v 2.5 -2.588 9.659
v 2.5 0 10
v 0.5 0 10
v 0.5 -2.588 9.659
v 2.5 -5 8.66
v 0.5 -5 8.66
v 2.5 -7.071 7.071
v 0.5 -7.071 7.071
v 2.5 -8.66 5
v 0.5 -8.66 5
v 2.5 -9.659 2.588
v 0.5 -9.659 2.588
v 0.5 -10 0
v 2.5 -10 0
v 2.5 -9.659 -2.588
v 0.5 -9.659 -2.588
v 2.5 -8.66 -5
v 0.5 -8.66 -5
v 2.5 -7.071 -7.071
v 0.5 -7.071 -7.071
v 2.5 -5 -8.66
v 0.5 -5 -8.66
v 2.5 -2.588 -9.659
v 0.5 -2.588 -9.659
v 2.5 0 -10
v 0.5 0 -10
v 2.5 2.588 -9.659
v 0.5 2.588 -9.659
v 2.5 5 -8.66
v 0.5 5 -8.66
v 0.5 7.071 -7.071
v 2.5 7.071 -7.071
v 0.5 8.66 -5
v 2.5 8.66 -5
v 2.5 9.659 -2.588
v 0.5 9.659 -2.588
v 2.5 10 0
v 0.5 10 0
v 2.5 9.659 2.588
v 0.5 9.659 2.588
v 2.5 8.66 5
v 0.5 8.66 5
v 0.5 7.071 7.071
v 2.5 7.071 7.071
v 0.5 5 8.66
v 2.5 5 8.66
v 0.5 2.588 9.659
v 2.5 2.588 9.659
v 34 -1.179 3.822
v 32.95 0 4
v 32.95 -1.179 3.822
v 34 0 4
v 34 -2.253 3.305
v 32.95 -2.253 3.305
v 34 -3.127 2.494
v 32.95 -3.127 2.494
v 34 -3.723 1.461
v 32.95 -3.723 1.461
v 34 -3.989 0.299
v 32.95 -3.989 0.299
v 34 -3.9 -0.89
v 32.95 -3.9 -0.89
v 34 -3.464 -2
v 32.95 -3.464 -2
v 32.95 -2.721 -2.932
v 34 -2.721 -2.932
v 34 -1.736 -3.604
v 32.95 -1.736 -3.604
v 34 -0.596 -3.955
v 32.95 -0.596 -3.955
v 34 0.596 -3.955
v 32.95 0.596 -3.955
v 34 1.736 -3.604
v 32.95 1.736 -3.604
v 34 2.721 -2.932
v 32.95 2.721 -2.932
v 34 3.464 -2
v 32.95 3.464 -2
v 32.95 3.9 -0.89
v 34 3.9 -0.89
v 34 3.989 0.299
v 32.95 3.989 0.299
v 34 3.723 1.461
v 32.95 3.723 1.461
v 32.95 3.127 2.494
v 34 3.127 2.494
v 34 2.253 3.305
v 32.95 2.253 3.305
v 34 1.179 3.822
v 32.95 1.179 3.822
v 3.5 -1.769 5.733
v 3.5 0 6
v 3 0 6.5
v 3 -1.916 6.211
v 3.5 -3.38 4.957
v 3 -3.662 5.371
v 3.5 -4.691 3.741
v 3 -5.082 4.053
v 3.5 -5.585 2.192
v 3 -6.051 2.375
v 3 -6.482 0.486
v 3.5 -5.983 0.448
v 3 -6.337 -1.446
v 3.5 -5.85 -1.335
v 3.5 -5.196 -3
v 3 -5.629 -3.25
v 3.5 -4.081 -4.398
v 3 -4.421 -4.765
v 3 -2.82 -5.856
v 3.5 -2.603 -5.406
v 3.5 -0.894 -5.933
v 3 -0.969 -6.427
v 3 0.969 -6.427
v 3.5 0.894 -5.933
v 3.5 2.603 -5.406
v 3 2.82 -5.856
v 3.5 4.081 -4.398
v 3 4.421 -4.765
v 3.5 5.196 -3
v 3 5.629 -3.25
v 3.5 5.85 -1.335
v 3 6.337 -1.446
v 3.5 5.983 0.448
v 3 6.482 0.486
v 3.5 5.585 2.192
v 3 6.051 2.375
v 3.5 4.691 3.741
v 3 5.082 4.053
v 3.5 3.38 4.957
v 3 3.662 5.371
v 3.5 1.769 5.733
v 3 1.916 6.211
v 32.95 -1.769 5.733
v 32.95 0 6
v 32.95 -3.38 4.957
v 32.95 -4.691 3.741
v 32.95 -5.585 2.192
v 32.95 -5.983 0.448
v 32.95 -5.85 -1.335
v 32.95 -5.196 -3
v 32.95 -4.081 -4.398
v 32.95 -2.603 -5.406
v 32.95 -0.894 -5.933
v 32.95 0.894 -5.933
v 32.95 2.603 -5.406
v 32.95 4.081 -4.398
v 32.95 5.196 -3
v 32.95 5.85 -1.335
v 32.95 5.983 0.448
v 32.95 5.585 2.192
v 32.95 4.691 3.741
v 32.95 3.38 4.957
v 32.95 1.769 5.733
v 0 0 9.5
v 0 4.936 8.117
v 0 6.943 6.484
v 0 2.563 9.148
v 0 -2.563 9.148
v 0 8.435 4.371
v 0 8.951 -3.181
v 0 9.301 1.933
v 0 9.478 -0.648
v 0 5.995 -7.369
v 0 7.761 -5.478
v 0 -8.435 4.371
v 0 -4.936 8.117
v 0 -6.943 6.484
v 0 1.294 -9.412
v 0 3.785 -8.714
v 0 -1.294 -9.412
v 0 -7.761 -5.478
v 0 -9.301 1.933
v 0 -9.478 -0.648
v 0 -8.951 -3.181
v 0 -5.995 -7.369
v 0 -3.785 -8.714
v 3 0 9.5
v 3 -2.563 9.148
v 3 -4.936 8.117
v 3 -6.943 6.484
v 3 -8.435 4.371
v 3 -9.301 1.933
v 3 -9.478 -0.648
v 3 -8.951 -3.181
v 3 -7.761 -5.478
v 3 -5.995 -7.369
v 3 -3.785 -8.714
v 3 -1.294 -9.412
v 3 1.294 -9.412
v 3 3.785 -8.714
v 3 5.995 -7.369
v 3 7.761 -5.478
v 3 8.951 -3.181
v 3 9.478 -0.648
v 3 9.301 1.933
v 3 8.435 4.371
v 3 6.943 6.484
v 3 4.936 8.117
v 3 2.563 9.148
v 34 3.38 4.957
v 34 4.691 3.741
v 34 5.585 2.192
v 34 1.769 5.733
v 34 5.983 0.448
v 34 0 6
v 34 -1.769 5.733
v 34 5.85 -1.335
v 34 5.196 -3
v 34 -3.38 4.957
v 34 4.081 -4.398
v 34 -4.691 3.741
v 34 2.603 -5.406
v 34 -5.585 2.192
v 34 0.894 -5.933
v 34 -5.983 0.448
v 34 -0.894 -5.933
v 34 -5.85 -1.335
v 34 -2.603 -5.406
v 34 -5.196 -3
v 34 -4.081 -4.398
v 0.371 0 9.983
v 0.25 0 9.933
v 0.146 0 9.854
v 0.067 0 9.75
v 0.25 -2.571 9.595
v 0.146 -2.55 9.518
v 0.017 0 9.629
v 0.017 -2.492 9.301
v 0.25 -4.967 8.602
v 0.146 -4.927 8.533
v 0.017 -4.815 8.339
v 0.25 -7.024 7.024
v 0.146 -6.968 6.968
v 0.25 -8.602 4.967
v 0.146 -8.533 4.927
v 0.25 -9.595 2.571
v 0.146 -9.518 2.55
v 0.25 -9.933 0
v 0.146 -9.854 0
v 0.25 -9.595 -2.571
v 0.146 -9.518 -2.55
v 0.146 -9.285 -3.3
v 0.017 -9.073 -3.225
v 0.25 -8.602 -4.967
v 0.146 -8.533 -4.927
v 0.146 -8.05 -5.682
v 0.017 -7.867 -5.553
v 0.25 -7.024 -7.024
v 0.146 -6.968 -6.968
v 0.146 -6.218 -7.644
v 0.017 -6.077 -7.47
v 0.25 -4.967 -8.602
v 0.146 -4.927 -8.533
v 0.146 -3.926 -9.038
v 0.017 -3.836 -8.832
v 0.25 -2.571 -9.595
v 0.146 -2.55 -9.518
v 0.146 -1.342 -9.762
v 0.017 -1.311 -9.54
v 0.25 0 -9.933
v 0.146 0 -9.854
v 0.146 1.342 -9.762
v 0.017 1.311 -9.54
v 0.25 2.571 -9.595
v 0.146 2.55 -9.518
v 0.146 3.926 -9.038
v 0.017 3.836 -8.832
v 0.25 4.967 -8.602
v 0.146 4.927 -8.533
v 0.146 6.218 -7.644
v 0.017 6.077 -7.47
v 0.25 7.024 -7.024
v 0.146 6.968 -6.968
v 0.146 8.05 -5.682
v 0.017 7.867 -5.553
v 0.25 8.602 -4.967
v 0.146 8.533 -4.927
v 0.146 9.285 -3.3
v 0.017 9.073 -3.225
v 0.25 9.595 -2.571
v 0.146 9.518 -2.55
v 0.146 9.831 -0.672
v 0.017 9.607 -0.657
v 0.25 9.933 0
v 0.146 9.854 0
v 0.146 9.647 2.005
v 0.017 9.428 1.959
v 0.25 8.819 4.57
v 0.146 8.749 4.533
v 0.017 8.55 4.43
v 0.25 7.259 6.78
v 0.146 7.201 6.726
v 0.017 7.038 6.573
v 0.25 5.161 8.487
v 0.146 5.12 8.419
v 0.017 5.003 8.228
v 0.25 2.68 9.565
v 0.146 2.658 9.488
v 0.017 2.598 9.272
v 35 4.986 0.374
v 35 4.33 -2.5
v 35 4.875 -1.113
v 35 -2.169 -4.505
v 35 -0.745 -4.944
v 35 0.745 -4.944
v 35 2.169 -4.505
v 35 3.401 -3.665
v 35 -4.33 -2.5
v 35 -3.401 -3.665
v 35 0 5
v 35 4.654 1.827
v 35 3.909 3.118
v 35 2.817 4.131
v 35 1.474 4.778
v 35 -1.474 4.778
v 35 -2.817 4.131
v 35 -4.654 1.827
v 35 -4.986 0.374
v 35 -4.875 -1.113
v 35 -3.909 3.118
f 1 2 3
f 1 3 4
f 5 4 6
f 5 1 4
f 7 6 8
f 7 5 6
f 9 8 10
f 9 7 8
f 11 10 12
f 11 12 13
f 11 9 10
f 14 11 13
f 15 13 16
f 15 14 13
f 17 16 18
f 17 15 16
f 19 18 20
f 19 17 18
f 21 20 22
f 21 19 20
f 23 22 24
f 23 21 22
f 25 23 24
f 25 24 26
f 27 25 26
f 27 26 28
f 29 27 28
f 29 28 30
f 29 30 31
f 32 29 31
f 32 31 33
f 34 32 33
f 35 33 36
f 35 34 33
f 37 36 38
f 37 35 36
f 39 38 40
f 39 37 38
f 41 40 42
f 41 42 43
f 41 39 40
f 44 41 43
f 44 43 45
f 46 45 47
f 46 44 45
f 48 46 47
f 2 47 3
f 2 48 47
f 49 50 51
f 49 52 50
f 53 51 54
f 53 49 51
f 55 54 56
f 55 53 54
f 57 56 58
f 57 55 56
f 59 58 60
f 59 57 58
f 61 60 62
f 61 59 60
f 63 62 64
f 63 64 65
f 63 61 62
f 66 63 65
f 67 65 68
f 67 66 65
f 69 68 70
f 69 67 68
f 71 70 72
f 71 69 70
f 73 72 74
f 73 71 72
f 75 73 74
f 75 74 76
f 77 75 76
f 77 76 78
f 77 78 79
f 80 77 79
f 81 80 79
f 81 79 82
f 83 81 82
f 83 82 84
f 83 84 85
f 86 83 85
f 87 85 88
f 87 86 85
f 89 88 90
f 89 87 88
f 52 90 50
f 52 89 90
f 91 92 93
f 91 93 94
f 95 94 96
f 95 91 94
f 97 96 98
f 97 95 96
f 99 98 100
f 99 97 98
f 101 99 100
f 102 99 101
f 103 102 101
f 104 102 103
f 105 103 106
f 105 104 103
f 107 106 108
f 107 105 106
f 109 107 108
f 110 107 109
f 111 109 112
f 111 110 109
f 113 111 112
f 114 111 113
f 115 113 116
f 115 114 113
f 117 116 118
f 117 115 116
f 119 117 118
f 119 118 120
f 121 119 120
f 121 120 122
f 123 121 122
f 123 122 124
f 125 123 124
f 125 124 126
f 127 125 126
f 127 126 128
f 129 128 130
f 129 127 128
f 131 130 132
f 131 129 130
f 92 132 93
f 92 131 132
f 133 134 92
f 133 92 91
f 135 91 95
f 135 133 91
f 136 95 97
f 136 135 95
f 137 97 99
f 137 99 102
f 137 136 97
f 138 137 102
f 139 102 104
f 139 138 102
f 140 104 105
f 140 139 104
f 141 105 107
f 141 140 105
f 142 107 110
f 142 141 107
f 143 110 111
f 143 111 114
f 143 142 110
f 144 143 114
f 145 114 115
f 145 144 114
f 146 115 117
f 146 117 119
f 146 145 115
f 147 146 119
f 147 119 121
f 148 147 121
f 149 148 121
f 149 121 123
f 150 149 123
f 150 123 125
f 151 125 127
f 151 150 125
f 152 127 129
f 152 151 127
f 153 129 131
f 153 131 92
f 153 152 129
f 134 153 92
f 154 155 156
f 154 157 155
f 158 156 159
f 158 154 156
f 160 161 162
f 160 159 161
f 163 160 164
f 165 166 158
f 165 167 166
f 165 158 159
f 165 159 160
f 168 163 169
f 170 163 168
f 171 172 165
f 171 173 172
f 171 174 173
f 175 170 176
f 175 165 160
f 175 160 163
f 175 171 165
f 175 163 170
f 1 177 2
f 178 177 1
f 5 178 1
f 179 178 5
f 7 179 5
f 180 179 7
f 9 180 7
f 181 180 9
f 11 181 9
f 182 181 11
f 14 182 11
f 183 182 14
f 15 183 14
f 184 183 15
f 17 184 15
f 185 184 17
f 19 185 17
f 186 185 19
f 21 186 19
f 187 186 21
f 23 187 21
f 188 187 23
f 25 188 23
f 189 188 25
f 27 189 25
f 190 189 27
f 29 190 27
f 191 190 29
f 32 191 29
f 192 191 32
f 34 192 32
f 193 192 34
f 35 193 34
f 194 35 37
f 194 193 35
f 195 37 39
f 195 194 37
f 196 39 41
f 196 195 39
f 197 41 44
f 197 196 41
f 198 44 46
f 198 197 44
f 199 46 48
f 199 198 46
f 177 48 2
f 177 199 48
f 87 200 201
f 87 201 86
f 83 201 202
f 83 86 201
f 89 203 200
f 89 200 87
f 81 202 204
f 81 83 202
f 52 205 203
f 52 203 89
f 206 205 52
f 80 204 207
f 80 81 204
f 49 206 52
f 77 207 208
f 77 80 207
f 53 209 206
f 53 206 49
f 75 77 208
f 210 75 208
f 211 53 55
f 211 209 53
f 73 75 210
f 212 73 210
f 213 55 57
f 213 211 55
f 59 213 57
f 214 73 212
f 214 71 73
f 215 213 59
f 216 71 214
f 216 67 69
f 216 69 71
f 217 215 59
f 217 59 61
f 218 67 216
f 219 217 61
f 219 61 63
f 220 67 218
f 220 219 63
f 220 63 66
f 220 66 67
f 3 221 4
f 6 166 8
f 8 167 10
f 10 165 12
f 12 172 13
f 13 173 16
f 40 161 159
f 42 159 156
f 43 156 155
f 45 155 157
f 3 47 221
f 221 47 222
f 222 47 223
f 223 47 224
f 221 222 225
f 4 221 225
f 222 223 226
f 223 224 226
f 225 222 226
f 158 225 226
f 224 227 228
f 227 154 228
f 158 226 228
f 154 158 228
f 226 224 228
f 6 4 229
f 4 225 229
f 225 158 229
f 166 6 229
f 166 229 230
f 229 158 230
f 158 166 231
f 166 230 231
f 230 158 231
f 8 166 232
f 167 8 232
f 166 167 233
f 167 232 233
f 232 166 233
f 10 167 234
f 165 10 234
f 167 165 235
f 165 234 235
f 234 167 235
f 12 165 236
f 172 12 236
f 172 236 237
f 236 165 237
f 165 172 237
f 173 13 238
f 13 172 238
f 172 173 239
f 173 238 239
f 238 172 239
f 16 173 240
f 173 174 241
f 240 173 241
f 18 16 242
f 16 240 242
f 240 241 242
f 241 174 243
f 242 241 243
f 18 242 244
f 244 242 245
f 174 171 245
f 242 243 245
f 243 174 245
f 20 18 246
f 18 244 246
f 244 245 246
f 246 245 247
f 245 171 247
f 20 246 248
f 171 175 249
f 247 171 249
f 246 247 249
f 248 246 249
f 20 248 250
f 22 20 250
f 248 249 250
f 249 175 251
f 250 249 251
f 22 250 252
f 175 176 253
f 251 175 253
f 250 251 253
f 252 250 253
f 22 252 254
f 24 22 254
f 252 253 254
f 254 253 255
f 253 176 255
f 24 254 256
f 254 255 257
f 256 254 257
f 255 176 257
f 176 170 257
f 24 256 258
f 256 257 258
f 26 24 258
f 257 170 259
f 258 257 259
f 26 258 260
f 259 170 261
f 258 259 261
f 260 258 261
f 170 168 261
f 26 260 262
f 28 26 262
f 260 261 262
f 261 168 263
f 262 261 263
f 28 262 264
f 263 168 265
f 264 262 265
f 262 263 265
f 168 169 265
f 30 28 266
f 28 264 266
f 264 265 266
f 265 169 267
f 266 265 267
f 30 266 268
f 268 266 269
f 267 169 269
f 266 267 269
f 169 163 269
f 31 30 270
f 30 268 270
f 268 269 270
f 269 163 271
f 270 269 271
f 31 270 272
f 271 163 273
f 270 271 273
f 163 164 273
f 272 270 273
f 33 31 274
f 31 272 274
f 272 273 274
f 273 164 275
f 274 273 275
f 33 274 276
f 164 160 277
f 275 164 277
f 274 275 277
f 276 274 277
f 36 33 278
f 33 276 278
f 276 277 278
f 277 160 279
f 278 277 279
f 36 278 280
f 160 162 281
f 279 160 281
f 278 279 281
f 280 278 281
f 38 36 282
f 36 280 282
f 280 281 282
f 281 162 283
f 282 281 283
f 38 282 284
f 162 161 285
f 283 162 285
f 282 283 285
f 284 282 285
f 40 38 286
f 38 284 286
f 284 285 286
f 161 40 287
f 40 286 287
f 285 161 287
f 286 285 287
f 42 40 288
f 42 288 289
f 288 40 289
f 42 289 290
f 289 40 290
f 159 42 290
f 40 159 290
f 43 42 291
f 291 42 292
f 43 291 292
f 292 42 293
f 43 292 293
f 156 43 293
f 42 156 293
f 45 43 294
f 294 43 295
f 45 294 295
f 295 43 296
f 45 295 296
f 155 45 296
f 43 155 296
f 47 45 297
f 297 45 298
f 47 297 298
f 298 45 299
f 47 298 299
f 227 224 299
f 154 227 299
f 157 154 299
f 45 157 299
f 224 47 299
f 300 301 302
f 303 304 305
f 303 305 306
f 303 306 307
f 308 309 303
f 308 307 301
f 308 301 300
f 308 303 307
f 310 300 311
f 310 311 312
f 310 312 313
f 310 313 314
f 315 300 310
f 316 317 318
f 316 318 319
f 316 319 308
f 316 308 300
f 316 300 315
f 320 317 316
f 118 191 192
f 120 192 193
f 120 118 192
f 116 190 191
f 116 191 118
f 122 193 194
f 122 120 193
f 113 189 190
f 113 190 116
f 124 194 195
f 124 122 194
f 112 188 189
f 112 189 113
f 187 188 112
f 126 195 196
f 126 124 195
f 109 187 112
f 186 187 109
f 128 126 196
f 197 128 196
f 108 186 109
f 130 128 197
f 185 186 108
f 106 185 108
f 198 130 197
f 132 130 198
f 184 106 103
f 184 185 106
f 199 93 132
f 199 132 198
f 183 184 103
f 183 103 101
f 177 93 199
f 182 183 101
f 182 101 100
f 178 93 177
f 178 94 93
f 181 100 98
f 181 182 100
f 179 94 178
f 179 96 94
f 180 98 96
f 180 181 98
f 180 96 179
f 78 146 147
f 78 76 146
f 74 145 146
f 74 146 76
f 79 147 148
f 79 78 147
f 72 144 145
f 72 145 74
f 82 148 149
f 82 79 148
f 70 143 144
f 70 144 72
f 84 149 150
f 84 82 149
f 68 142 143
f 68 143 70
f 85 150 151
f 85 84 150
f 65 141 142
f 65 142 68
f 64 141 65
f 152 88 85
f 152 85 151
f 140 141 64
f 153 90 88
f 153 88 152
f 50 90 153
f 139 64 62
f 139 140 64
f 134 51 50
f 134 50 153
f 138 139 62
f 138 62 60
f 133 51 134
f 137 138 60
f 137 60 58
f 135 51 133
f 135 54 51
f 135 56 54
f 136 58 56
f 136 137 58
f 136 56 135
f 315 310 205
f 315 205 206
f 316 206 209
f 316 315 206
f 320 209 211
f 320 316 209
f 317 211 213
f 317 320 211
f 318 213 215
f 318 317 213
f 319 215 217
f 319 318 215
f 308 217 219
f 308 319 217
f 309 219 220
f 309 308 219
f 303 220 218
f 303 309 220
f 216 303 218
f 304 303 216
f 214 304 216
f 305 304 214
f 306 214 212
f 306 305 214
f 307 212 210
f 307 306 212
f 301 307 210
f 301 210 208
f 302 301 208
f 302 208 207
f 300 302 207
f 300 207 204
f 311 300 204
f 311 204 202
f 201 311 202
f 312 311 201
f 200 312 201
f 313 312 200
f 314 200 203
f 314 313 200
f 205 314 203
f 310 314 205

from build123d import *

# Parameters (mm, degrees)
SMUSSO1_SIZE = 0.5
SMUSSO2_SIZE = 0.5
SMUSSO3_SIZE = 1
RACCORDO1_R  = 0.5


with BuildPart() as part:
    # Schizzo1 → Rivoluzione1 (revolve)
    with BuildSketch(Plane.XY, mode=Mode.PRIVATE) as rivoluzione1_sk:
        Polygon((0, 0), (0, 10), (3, 10), (3, 6), (32.95, 6), (32.95, 4), (34, 4), (34, 6), (35, 6), (35, 0), align=None)
    revolve(rivoluzione1_sk.sketch.rotate(Axis((-16.326077986, 0, 0), (1, 0, 0)), 90), axis=Axis((-16.326077986, 0, 0), (1, 0, 0)))

    # Smusso1
    smusso1_edges = [part.edges().sort_by_distance(p)[0] for p in [
        (3, 0, -10),
    ]]
    chamfer(smusso1_edges, length=SMUSSO1_SIZE)

    # Smusso2
    smusso2_edges = [part.edges().sort_by_distance(p)[0] for p in [
        (3, 0, -6),
    ]]
    chamfer(smusso2_edges, length=SMUSSO2_SIZE)

    # Smusso3
    smusso3_edges = [part.edges().sort_by_distance(p)[0] for p in [
        (35, 0, -6),
    ]]
    chamfer(smusso3_edges, length=SMUSSO3_SIZE - 0.0001)  # a hair under: the kernel refuses the full size

    # Raccordo1
    raccordo1_edges = [part.edges().sort_by_distance(p)[0] for p in [
        (0, 0, -10),
    ]]
    fillet(raccordo1_edges, radius=RACCORDO1_R)


solid = part.part
